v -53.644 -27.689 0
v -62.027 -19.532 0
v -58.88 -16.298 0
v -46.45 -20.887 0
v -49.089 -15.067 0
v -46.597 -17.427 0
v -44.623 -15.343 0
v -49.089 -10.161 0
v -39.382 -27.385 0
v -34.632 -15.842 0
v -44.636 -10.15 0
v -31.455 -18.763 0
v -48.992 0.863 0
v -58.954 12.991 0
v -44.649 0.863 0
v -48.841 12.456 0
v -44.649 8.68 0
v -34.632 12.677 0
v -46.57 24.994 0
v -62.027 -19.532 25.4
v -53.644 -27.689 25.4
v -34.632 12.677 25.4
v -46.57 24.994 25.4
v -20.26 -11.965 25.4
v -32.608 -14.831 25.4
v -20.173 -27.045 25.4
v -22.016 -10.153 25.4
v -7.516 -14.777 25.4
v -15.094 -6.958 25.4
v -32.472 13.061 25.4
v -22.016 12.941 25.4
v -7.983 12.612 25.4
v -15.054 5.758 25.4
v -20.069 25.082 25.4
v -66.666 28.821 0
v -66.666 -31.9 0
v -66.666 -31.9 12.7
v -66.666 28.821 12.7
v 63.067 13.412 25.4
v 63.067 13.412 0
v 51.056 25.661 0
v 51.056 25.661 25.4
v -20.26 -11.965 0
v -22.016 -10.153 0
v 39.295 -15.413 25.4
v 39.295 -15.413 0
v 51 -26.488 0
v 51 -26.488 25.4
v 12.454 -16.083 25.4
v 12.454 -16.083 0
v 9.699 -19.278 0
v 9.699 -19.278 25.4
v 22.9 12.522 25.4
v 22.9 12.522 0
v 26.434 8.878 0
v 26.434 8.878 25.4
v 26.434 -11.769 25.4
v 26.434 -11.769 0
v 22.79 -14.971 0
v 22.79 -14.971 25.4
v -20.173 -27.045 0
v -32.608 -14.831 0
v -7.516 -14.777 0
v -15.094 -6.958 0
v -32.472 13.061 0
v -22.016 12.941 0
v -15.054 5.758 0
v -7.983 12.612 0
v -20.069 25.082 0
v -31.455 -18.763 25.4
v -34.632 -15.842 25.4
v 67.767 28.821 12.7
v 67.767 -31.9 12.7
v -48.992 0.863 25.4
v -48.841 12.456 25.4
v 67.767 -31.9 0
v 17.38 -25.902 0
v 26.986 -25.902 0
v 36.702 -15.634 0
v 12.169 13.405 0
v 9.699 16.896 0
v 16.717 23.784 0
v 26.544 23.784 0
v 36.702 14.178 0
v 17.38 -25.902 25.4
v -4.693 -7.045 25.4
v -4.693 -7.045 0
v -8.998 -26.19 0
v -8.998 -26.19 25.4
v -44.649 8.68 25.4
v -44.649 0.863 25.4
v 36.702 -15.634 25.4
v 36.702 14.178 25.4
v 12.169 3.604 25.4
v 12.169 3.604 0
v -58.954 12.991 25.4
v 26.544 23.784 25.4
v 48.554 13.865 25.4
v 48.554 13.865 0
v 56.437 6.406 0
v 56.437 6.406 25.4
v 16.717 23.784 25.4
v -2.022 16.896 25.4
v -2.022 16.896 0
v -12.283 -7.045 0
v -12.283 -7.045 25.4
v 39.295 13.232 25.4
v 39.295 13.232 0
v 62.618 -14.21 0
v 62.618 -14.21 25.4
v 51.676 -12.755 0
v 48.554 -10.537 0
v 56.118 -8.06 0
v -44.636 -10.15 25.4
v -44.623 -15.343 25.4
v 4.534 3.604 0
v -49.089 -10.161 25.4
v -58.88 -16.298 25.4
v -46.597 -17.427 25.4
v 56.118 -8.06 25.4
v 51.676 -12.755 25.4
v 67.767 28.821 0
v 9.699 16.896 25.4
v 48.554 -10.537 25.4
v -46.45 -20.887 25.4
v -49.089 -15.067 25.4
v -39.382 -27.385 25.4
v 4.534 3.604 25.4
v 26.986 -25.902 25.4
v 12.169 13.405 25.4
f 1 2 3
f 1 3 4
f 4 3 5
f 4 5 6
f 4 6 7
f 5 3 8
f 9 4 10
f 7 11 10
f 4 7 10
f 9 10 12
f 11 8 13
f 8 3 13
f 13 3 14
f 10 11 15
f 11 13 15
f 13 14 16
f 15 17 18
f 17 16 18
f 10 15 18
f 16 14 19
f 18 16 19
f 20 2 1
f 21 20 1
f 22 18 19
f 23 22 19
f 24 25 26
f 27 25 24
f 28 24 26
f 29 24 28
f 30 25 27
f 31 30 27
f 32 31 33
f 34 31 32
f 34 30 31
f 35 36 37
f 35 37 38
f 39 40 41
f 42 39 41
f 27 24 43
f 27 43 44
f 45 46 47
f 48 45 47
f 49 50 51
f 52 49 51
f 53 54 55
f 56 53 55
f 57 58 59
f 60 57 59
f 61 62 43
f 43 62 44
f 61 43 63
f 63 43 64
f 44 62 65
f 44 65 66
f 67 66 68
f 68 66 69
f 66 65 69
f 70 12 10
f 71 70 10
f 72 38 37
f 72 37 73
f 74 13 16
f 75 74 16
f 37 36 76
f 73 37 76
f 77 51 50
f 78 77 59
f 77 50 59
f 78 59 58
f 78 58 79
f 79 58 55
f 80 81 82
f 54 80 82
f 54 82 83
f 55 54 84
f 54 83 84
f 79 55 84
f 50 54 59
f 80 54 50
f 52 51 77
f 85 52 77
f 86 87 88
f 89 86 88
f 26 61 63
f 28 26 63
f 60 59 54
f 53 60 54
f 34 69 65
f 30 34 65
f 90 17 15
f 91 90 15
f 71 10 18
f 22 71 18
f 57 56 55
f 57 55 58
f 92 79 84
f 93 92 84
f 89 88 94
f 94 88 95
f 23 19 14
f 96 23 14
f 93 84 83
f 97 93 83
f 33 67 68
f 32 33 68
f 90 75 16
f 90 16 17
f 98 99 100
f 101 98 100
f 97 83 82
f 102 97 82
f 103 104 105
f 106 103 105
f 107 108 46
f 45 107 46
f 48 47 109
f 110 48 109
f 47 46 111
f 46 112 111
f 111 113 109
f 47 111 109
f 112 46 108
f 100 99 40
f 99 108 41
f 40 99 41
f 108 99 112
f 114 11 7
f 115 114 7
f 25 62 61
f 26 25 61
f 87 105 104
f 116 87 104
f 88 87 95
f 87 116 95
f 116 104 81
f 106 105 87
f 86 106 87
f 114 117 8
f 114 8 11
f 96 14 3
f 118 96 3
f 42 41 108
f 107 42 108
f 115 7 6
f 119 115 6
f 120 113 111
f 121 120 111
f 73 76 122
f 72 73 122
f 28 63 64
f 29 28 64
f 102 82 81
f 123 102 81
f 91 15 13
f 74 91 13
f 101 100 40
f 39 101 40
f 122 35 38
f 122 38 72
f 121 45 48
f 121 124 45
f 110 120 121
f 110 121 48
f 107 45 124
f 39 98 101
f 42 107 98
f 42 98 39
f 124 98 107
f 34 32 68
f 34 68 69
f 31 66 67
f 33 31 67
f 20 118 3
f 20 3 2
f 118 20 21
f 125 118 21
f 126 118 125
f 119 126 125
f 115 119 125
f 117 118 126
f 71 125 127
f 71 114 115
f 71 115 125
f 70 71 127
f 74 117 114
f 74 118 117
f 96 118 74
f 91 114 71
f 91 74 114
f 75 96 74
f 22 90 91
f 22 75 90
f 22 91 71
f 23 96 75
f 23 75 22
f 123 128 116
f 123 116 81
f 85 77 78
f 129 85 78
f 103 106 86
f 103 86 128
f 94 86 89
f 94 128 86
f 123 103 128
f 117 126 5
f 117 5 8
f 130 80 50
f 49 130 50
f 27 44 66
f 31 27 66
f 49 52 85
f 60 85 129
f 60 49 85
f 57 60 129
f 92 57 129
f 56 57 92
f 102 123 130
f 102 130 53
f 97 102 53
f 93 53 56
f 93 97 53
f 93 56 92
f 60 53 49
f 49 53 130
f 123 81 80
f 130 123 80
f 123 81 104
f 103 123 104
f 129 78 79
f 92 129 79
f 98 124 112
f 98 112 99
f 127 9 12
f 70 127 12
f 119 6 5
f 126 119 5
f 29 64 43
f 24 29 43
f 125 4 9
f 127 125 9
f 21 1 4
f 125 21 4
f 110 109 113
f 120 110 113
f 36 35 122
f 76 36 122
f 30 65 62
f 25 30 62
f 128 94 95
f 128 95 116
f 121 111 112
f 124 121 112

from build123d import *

# Parameters (mm, degrees)
F2_DEPTH = 25.4
F1_W     = 134.433285
F1_H     = 60.721548
F3_DEPTH = 12.7


with BuildPart() as f2:
    # F0 (on Top) → F2 (new body)
    with BuildSketch(Plane.XY):
        Polygon((-46.570007, 24.994051), (-58.954094, 12.991015), (-58.880398, -16.298256), (-62.026743, -19.531999), (-53.643543, -27.688626), (-46.4495, -20.887064), (-39.38236, -27.384893), (-31.45507, -18.763049), (-34.632402, -15.841674), (-34.632402, 12.677473), align=None)
        Polygon((-46.597473, -17.427281), (-49.088683, -15.067188), (-49.088821, -10.160887), (-44.636333, -10.149683), (-44.623265, -15.343393), align=None, mode=Mode.SUBTRACT)
        Polygon((-44.648975, 0.862992), (-48.991621, 0.862992), (-48.840575, 12.455975), (-44.648975, 8.679759), align=None, mode=Mode.SUBTRACT)
        Polygon((-20.069168, 25.081754), (-32.471523, 13.061012), (-32.607883, -14.831058), (-20.172886, -27.044636), (-7.515955, -14.777152), (-15.094181, -6.958347), (-20.259832, -11.965055), (-22.016261, -10.152866), (-22.016261, 12.941212), (-15.054393, 5.758331), (-7.983122, 12.612023), align=None)
        Polygon((16.717242, 23.784157), (9.698734, 16.896296), (12.168618, 13.405193), (12.454424, -16.082504), (9.698734, -19.277502), (17.379729, -25.902372), (26.985792, -25.902372), (36.702268, -15.633823), (36.702268, 14.178094), (26.544135, 23.784157), align=None)
        Polygon((22.790039, -14.971335), (22.900455, 12.521876), (26.433719, 8.878198), (26.433719, -11.769316), align=None, mode=Mode.SUBTRACT)
        Polygon((9.698734, 16.896296), (-2.022001, 16.896296), (-12.283466, -7.044969), (-4.693273, -7.044969), (-8.998157, -26.190383), (12.168618, 3.603816), (4.534423, 3.603816), align=None)
        Polygon((63.066716, 13.412185), (51.056158, 25.661202), (39.295384, 13.232202), (39.295384, -15.412994), (51.000082, -26.488406), (62.618037, -14.21034), (56.118293, -8.060045), (51.675872, -12.754878), (48.553905, -10.536931), (48.553905, 13.865202), (56.437075, 6.405858), align=None)
    extrude(amount=F2_DEPTH)


with BuildPart() as f3:
    # F1 (on Top) → F3 (new body)
    with BuildSketch(Plane.XY):
        with Locations((0.550576, -1.539695)):
            Rectangle(F1_W, F1_H)
    extrude(amount=F3_DEPTH)


solid = Compound([f2.part, f3.part])
